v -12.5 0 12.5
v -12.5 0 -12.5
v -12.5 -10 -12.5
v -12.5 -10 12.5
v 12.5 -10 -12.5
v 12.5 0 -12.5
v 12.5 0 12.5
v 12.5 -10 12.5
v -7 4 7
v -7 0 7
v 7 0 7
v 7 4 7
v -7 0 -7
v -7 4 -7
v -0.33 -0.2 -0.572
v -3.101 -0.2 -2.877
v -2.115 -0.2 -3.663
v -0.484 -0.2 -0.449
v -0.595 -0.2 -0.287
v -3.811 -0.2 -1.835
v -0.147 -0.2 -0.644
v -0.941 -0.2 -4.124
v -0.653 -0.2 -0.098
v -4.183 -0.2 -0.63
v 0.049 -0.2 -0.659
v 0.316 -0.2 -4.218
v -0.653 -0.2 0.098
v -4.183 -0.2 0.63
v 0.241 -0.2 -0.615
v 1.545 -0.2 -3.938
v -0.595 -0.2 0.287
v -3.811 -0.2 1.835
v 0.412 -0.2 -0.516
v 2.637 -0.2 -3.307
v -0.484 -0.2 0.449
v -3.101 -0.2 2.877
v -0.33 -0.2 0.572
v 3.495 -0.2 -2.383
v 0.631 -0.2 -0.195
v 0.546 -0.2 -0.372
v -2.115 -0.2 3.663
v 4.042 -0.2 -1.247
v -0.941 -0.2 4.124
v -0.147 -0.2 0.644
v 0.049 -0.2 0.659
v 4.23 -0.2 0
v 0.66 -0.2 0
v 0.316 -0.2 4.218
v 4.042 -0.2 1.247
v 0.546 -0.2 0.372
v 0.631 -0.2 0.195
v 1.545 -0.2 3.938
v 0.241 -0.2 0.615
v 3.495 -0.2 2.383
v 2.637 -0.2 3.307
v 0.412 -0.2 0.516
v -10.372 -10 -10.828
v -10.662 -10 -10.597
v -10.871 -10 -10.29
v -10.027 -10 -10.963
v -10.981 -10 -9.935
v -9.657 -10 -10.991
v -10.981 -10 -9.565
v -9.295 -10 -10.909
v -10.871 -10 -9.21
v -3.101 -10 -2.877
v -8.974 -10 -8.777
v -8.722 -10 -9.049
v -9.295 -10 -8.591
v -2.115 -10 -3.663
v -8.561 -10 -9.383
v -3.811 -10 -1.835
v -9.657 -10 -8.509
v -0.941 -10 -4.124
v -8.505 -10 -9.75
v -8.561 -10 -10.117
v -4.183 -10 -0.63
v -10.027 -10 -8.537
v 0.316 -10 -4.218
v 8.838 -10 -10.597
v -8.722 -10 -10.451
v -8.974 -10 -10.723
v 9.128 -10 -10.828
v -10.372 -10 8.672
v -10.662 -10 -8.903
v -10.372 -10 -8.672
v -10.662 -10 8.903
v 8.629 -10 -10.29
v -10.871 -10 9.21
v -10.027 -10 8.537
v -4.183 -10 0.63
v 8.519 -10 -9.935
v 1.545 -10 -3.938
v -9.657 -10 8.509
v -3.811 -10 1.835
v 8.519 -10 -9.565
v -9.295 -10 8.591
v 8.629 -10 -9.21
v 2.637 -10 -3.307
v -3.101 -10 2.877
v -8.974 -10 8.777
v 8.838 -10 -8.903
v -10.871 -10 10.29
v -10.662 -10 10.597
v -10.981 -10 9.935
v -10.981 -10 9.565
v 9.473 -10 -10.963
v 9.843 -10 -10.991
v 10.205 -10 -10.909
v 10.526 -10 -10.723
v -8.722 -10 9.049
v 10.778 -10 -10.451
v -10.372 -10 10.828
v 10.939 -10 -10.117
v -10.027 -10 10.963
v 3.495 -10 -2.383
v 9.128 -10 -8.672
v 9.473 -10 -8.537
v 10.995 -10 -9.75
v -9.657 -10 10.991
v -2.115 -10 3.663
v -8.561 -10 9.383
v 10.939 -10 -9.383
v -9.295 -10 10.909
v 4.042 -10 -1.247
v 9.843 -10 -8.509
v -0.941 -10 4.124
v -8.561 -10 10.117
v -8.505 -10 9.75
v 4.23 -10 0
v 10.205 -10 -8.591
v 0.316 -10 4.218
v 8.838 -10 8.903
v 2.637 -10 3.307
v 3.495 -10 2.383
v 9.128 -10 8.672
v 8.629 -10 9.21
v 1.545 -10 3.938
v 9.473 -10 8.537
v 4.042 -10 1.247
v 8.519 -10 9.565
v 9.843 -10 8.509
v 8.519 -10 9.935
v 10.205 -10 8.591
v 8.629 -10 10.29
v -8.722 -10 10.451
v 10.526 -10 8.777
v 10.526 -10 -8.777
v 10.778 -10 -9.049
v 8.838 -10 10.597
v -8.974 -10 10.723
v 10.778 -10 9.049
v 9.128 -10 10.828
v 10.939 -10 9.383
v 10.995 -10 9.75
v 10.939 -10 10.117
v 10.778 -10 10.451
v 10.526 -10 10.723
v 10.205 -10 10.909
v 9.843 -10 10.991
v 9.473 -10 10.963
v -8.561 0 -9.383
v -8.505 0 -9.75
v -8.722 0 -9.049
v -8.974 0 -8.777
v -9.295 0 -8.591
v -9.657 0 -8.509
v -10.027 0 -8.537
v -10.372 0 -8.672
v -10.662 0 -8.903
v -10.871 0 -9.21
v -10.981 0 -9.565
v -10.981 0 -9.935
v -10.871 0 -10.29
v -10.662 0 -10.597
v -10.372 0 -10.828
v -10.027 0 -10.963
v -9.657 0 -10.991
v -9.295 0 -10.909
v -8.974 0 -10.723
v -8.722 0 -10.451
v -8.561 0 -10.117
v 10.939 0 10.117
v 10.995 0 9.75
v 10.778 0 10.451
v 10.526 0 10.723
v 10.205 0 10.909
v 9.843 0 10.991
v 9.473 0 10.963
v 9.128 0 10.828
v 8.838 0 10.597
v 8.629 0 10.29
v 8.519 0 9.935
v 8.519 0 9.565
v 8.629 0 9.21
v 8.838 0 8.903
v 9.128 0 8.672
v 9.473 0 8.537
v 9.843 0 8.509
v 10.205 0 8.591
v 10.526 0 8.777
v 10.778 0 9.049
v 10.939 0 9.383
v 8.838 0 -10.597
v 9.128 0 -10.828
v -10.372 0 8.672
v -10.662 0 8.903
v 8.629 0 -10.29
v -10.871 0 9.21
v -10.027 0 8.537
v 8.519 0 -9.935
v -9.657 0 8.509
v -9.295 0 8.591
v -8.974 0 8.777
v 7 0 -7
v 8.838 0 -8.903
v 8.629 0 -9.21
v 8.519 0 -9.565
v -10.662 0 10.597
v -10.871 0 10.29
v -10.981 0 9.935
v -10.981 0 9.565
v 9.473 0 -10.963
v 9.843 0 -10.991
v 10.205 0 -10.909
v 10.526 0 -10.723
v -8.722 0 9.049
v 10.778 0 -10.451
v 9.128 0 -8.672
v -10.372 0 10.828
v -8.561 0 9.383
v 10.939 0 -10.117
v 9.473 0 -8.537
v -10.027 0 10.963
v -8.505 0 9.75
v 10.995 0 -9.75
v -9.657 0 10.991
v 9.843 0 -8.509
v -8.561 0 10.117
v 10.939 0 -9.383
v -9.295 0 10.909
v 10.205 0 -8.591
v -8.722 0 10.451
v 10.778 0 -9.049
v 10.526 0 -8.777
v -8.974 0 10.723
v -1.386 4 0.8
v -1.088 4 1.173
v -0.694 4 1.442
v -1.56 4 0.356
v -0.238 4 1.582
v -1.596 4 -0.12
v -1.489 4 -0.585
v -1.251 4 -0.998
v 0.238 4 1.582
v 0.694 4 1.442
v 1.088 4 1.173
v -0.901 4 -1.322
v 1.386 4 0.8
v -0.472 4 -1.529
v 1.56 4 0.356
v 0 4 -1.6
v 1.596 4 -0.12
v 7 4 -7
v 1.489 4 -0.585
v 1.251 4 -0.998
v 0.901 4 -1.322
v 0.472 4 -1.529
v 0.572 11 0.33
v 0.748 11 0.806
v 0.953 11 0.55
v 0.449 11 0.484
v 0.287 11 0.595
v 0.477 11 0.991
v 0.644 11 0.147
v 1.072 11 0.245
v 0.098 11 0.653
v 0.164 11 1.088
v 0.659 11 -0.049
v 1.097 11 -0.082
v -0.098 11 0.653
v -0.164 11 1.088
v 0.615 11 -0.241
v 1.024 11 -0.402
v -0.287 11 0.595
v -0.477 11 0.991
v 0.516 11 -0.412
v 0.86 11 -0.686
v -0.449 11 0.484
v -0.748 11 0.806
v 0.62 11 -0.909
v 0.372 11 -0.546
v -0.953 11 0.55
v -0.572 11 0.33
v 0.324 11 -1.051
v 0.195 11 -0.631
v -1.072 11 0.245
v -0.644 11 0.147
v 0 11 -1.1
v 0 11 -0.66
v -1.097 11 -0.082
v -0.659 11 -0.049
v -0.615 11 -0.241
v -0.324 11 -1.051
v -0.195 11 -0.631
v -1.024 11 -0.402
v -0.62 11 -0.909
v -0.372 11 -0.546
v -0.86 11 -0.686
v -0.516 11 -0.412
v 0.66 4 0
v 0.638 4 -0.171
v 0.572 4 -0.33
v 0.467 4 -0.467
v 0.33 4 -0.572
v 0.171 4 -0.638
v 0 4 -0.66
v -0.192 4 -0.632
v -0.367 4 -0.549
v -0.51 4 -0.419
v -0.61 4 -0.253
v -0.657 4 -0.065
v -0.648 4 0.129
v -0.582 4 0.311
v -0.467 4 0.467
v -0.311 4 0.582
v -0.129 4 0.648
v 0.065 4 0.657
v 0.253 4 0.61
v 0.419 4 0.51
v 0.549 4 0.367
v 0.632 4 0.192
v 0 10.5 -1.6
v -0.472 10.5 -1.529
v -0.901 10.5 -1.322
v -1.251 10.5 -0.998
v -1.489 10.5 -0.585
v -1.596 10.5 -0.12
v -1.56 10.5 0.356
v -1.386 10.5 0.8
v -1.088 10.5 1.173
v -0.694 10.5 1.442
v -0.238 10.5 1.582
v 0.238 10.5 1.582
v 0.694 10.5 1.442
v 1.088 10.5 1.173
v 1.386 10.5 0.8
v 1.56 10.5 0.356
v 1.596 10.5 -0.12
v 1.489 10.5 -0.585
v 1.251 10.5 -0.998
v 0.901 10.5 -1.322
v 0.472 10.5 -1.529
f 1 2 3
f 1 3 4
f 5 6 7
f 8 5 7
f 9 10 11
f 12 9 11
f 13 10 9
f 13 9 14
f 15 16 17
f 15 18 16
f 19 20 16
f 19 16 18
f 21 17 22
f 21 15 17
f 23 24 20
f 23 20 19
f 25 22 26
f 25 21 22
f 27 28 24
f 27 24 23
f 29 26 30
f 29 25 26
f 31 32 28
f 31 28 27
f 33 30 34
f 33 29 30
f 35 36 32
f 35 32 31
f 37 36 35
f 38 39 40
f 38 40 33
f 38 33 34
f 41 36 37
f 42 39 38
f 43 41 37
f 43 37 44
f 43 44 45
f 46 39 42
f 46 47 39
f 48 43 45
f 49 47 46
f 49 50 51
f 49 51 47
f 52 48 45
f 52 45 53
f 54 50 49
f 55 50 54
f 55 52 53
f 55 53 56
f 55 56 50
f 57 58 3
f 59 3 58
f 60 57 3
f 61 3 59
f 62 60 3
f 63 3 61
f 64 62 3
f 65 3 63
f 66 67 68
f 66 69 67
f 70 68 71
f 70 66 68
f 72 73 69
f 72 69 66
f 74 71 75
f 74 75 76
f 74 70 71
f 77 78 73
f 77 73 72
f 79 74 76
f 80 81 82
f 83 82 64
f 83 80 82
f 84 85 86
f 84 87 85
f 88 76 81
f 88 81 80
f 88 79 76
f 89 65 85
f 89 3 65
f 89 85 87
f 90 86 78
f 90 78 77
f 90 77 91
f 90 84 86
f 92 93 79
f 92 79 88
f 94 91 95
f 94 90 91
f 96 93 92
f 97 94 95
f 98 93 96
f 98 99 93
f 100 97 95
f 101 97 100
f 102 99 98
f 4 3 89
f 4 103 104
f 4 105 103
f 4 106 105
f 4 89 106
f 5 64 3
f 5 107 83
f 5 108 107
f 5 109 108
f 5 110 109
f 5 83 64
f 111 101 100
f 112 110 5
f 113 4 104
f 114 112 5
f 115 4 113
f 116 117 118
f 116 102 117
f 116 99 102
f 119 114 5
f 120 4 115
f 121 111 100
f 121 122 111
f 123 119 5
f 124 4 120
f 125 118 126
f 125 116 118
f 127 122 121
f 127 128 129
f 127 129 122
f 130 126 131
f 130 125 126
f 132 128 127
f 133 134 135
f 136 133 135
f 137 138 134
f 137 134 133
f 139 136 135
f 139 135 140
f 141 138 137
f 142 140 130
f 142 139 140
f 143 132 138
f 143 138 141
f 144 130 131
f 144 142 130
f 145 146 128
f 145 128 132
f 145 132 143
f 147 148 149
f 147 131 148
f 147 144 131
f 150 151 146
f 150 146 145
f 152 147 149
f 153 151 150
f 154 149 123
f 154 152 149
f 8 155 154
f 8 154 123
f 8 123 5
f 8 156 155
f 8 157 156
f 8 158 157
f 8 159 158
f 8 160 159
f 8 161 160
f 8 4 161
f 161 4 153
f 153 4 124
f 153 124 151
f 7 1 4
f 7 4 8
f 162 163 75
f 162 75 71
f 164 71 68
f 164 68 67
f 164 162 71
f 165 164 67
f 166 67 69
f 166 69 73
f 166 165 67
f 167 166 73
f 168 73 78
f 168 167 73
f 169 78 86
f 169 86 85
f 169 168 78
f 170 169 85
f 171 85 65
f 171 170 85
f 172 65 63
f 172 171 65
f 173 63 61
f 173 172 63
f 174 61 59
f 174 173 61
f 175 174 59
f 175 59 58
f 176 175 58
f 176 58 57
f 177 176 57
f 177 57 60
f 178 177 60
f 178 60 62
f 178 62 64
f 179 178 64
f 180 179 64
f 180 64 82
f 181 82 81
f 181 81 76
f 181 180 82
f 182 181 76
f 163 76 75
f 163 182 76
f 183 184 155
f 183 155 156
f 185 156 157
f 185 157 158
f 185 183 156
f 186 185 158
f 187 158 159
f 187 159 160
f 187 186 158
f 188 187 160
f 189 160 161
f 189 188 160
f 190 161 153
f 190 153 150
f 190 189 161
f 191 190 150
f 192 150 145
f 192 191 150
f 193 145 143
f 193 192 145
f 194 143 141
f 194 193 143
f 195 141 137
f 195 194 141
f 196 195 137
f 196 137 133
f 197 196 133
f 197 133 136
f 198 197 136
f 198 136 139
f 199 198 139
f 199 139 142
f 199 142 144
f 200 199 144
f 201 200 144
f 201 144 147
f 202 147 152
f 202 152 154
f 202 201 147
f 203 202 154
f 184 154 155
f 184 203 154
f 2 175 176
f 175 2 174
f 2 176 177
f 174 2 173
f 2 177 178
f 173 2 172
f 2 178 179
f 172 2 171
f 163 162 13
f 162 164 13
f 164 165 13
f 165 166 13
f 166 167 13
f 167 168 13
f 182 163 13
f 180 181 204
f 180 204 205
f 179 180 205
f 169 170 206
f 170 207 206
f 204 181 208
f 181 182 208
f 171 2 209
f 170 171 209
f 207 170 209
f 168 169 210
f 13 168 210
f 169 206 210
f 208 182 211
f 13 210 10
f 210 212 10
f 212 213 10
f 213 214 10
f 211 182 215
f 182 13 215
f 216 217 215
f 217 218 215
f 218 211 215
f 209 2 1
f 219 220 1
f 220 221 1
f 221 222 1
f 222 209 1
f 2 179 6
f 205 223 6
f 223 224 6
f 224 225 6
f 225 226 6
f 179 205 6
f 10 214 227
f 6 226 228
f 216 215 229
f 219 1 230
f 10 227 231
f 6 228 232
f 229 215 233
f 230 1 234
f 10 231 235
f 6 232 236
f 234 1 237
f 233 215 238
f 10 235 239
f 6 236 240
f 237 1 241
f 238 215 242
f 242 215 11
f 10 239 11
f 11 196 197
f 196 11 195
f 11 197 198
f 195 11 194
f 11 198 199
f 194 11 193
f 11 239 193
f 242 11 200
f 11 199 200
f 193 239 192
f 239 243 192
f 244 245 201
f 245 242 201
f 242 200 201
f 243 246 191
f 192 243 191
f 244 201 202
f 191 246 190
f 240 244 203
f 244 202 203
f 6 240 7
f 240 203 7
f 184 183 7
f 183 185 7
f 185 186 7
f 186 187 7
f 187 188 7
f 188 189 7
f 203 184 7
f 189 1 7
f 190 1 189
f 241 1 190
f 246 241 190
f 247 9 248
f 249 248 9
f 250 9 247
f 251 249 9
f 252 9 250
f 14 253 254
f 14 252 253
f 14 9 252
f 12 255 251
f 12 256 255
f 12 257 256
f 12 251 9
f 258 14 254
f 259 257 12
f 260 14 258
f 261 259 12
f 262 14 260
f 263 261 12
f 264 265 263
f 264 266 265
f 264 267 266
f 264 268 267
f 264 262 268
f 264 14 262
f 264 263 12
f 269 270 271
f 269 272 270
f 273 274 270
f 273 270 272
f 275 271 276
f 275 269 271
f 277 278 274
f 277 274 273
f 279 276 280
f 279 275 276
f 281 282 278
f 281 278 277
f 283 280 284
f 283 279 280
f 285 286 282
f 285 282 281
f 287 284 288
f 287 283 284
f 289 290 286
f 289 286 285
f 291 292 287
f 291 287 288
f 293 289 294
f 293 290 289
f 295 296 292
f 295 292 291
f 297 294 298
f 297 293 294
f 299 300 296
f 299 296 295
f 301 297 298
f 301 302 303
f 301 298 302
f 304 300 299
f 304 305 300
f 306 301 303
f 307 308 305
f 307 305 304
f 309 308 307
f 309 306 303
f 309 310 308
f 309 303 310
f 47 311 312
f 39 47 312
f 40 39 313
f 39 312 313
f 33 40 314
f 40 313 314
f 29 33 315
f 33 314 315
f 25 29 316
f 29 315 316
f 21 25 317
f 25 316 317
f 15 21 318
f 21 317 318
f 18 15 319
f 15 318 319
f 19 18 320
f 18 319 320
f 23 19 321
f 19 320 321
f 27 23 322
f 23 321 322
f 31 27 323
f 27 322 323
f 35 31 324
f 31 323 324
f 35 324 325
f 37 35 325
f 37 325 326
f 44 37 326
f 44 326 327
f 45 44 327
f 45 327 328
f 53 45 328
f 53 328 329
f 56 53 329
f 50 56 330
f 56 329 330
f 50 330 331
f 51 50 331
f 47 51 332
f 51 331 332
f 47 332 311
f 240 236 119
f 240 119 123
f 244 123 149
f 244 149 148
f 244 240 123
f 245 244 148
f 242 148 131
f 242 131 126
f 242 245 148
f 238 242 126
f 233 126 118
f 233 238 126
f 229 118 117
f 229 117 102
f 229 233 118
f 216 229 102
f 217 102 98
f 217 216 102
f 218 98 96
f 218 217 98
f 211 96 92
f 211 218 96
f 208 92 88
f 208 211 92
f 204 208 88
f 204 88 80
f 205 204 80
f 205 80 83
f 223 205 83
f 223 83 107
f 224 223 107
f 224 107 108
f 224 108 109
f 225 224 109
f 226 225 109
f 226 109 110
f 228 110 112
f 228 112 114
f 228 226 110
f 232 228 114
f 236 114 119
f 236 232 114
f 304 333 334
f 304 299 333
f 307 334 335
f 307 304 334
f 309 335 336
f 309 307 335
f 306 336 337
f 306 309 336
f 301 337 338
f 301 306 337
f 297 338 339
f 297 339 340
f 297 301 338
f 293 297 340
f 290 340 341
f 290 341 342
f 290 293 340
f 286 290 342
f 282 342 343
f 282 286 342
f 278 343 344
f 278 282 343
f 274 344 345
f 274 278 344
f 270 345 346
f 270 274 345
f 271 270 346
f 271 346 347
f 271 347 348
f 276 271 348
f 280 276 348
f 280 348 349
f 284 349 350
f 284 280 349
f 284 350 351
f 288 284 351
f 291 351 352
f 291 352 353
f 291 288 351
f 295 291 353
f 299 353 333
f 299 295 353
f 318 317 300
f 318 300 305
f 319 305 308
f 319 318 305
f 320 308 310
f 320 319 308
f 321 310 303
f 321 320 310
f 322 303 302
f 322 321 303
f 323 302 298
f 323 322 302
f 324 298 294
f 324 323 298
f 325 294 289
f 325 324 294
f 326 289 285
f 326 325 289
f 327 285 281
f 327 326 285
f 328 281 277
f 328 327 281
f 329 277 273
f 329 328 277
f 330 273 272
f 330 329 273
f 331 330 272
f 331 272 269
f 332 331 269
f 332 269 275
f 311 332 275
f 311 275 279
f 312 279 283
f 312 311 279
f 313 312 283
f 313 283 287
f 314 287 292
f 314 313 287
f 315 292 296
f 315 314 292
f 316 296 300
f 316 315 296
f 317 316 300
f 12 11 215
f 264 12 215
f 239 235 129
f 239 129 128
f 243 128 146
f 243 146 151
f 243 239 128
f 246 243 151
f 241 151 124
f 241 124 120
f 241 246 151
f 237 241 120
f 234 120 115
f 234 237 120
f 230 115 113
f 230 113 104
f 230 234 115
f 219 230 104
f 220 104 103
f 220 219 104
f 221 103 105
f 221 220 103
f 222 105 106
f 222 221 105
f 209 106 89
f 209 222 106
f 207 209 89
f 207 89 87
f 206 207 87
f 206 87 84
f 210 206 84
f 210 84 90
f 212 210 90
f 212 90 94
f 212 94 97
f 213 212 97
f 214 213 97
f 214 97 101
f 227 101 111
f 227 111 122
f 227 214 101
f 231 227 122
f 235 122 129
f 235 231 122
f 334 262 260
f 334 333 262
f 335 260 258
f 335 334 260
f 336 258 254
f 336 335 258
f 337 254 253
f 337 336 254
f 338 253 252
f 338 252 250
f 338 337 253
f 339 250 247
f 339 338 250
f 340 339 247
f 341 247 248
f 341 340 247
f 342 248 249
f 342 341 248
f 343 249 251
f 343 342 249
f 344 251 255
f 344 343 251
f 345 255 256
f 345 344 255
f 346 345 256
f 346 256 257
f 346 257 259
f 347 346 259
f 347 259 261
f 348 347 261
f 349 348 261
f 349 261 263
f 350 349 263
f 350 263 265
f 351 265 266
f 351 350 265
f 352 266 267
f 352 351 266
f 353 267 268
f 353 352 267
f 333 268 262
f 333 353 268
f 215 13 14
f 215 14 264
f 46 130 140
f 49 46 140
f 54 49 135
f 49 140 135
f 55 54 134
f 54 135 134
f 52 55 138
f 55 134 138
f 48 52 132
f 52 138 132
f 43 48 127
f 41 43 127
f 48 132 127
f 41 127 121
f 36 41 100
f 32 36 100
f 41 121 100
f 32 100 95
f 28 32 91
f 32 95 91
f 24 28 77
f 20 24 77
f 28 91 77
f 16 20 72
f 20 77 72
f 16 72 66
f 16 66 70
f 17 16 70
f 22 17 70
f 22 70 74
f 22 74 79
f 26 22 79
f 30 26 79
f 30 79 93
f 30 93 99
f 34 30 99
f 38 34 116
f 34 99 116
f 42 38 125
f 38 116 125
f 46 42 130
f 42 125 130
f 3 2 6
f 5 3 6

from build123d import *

# Parameters (mm, degrees)
SKETCH1_W           = 14
SKETCH1_H           = 14
BOSS_EXTRUDE1_DEPTH = 4
SKETCH2_W           = 25
SKETCH2_H           = 25
SKETCH2_R           = 1.2446
BOSS_EXTRUDE2_DEPTH = 10
SKETCH3_R           = 4.23
CUT_EXTRUDE1_DEPTH  = 9.8
SKETCH5_R           = 0.6604
CUT_EXTRUDE2_DEPTH  = 14


with BuildPart() as part:
    # Sketch1 → Boss-Extrude1 (new body)
    with BuildSketch(Plane(origin=(0, 0, 0), x_dir=(1, 0, 0), z_dir=(0, 1, 0))):
        Rectangle(SKETCH1_W, SKETCH1_H)
    extrude(amount=BOSS_EXTRUDE1_DEPTH)

    # Sketch2 → Boss-Extrude2 (add)
    with BuildSketch(Plane.XZ):
        Rectangle(SKETCH2_W, SKETCH2_H)
        with Locations((-9.75, 9.75)):
            Circle(SKETCH2_R, mode=Mode.SUBTRACT)
        with Locations((9.75, 9.75)):
            Circle(SKETCH2_R, mode=Mode.SUBTRACT)
        with Locations((9.75, -9.75)):
            Circle(SKETCH2_R, mode=Mode.SUBTRACT)
        with Locations((-9.75, -9.75)):
            Circle(SKETCH2_R, mode=Mode.SUBTRACT)
    extrude(amount=BOSS_EXTRUDE2_DEPTH)

    # Sketch3 → Cut-Extrude1 (cut)
    with BuildSketch(Plane.XZ.offset(10)):
        Circle(SKETCH3_R)
    extrude(amount=-CUT_EXTRUDE1_DEPTH, mode=Mode.SUBTRACT)

    # Sketch4 → Revolve1 (revolve)
    with BuildSketch(Plane(origin=(0, 0, 0), x_dir=(0, 0, -1), z_dir=(1, 0, 0))):
        Polygon((0.6604, 11), (0.6604, 4), (1.6, 4), (1.6, 10.5), (1.1, 11), align=None)
    revolve(axis=Axis((0, 4, 0), (0, 1, 0)))

    # Sketch5 → Cut-Extrude2 (cut)
    with BuildSketch(Plane(origin=(0, 4, 0), x_dir=(1, 0, 0), z_dir=(0, 1, 0))):
        Circle(SKETCH5_R)
    extrude(amount=-CUT_EXTRUDE2_DEPTH, mode=Mode.SUBTRACT)


solid = part.part
